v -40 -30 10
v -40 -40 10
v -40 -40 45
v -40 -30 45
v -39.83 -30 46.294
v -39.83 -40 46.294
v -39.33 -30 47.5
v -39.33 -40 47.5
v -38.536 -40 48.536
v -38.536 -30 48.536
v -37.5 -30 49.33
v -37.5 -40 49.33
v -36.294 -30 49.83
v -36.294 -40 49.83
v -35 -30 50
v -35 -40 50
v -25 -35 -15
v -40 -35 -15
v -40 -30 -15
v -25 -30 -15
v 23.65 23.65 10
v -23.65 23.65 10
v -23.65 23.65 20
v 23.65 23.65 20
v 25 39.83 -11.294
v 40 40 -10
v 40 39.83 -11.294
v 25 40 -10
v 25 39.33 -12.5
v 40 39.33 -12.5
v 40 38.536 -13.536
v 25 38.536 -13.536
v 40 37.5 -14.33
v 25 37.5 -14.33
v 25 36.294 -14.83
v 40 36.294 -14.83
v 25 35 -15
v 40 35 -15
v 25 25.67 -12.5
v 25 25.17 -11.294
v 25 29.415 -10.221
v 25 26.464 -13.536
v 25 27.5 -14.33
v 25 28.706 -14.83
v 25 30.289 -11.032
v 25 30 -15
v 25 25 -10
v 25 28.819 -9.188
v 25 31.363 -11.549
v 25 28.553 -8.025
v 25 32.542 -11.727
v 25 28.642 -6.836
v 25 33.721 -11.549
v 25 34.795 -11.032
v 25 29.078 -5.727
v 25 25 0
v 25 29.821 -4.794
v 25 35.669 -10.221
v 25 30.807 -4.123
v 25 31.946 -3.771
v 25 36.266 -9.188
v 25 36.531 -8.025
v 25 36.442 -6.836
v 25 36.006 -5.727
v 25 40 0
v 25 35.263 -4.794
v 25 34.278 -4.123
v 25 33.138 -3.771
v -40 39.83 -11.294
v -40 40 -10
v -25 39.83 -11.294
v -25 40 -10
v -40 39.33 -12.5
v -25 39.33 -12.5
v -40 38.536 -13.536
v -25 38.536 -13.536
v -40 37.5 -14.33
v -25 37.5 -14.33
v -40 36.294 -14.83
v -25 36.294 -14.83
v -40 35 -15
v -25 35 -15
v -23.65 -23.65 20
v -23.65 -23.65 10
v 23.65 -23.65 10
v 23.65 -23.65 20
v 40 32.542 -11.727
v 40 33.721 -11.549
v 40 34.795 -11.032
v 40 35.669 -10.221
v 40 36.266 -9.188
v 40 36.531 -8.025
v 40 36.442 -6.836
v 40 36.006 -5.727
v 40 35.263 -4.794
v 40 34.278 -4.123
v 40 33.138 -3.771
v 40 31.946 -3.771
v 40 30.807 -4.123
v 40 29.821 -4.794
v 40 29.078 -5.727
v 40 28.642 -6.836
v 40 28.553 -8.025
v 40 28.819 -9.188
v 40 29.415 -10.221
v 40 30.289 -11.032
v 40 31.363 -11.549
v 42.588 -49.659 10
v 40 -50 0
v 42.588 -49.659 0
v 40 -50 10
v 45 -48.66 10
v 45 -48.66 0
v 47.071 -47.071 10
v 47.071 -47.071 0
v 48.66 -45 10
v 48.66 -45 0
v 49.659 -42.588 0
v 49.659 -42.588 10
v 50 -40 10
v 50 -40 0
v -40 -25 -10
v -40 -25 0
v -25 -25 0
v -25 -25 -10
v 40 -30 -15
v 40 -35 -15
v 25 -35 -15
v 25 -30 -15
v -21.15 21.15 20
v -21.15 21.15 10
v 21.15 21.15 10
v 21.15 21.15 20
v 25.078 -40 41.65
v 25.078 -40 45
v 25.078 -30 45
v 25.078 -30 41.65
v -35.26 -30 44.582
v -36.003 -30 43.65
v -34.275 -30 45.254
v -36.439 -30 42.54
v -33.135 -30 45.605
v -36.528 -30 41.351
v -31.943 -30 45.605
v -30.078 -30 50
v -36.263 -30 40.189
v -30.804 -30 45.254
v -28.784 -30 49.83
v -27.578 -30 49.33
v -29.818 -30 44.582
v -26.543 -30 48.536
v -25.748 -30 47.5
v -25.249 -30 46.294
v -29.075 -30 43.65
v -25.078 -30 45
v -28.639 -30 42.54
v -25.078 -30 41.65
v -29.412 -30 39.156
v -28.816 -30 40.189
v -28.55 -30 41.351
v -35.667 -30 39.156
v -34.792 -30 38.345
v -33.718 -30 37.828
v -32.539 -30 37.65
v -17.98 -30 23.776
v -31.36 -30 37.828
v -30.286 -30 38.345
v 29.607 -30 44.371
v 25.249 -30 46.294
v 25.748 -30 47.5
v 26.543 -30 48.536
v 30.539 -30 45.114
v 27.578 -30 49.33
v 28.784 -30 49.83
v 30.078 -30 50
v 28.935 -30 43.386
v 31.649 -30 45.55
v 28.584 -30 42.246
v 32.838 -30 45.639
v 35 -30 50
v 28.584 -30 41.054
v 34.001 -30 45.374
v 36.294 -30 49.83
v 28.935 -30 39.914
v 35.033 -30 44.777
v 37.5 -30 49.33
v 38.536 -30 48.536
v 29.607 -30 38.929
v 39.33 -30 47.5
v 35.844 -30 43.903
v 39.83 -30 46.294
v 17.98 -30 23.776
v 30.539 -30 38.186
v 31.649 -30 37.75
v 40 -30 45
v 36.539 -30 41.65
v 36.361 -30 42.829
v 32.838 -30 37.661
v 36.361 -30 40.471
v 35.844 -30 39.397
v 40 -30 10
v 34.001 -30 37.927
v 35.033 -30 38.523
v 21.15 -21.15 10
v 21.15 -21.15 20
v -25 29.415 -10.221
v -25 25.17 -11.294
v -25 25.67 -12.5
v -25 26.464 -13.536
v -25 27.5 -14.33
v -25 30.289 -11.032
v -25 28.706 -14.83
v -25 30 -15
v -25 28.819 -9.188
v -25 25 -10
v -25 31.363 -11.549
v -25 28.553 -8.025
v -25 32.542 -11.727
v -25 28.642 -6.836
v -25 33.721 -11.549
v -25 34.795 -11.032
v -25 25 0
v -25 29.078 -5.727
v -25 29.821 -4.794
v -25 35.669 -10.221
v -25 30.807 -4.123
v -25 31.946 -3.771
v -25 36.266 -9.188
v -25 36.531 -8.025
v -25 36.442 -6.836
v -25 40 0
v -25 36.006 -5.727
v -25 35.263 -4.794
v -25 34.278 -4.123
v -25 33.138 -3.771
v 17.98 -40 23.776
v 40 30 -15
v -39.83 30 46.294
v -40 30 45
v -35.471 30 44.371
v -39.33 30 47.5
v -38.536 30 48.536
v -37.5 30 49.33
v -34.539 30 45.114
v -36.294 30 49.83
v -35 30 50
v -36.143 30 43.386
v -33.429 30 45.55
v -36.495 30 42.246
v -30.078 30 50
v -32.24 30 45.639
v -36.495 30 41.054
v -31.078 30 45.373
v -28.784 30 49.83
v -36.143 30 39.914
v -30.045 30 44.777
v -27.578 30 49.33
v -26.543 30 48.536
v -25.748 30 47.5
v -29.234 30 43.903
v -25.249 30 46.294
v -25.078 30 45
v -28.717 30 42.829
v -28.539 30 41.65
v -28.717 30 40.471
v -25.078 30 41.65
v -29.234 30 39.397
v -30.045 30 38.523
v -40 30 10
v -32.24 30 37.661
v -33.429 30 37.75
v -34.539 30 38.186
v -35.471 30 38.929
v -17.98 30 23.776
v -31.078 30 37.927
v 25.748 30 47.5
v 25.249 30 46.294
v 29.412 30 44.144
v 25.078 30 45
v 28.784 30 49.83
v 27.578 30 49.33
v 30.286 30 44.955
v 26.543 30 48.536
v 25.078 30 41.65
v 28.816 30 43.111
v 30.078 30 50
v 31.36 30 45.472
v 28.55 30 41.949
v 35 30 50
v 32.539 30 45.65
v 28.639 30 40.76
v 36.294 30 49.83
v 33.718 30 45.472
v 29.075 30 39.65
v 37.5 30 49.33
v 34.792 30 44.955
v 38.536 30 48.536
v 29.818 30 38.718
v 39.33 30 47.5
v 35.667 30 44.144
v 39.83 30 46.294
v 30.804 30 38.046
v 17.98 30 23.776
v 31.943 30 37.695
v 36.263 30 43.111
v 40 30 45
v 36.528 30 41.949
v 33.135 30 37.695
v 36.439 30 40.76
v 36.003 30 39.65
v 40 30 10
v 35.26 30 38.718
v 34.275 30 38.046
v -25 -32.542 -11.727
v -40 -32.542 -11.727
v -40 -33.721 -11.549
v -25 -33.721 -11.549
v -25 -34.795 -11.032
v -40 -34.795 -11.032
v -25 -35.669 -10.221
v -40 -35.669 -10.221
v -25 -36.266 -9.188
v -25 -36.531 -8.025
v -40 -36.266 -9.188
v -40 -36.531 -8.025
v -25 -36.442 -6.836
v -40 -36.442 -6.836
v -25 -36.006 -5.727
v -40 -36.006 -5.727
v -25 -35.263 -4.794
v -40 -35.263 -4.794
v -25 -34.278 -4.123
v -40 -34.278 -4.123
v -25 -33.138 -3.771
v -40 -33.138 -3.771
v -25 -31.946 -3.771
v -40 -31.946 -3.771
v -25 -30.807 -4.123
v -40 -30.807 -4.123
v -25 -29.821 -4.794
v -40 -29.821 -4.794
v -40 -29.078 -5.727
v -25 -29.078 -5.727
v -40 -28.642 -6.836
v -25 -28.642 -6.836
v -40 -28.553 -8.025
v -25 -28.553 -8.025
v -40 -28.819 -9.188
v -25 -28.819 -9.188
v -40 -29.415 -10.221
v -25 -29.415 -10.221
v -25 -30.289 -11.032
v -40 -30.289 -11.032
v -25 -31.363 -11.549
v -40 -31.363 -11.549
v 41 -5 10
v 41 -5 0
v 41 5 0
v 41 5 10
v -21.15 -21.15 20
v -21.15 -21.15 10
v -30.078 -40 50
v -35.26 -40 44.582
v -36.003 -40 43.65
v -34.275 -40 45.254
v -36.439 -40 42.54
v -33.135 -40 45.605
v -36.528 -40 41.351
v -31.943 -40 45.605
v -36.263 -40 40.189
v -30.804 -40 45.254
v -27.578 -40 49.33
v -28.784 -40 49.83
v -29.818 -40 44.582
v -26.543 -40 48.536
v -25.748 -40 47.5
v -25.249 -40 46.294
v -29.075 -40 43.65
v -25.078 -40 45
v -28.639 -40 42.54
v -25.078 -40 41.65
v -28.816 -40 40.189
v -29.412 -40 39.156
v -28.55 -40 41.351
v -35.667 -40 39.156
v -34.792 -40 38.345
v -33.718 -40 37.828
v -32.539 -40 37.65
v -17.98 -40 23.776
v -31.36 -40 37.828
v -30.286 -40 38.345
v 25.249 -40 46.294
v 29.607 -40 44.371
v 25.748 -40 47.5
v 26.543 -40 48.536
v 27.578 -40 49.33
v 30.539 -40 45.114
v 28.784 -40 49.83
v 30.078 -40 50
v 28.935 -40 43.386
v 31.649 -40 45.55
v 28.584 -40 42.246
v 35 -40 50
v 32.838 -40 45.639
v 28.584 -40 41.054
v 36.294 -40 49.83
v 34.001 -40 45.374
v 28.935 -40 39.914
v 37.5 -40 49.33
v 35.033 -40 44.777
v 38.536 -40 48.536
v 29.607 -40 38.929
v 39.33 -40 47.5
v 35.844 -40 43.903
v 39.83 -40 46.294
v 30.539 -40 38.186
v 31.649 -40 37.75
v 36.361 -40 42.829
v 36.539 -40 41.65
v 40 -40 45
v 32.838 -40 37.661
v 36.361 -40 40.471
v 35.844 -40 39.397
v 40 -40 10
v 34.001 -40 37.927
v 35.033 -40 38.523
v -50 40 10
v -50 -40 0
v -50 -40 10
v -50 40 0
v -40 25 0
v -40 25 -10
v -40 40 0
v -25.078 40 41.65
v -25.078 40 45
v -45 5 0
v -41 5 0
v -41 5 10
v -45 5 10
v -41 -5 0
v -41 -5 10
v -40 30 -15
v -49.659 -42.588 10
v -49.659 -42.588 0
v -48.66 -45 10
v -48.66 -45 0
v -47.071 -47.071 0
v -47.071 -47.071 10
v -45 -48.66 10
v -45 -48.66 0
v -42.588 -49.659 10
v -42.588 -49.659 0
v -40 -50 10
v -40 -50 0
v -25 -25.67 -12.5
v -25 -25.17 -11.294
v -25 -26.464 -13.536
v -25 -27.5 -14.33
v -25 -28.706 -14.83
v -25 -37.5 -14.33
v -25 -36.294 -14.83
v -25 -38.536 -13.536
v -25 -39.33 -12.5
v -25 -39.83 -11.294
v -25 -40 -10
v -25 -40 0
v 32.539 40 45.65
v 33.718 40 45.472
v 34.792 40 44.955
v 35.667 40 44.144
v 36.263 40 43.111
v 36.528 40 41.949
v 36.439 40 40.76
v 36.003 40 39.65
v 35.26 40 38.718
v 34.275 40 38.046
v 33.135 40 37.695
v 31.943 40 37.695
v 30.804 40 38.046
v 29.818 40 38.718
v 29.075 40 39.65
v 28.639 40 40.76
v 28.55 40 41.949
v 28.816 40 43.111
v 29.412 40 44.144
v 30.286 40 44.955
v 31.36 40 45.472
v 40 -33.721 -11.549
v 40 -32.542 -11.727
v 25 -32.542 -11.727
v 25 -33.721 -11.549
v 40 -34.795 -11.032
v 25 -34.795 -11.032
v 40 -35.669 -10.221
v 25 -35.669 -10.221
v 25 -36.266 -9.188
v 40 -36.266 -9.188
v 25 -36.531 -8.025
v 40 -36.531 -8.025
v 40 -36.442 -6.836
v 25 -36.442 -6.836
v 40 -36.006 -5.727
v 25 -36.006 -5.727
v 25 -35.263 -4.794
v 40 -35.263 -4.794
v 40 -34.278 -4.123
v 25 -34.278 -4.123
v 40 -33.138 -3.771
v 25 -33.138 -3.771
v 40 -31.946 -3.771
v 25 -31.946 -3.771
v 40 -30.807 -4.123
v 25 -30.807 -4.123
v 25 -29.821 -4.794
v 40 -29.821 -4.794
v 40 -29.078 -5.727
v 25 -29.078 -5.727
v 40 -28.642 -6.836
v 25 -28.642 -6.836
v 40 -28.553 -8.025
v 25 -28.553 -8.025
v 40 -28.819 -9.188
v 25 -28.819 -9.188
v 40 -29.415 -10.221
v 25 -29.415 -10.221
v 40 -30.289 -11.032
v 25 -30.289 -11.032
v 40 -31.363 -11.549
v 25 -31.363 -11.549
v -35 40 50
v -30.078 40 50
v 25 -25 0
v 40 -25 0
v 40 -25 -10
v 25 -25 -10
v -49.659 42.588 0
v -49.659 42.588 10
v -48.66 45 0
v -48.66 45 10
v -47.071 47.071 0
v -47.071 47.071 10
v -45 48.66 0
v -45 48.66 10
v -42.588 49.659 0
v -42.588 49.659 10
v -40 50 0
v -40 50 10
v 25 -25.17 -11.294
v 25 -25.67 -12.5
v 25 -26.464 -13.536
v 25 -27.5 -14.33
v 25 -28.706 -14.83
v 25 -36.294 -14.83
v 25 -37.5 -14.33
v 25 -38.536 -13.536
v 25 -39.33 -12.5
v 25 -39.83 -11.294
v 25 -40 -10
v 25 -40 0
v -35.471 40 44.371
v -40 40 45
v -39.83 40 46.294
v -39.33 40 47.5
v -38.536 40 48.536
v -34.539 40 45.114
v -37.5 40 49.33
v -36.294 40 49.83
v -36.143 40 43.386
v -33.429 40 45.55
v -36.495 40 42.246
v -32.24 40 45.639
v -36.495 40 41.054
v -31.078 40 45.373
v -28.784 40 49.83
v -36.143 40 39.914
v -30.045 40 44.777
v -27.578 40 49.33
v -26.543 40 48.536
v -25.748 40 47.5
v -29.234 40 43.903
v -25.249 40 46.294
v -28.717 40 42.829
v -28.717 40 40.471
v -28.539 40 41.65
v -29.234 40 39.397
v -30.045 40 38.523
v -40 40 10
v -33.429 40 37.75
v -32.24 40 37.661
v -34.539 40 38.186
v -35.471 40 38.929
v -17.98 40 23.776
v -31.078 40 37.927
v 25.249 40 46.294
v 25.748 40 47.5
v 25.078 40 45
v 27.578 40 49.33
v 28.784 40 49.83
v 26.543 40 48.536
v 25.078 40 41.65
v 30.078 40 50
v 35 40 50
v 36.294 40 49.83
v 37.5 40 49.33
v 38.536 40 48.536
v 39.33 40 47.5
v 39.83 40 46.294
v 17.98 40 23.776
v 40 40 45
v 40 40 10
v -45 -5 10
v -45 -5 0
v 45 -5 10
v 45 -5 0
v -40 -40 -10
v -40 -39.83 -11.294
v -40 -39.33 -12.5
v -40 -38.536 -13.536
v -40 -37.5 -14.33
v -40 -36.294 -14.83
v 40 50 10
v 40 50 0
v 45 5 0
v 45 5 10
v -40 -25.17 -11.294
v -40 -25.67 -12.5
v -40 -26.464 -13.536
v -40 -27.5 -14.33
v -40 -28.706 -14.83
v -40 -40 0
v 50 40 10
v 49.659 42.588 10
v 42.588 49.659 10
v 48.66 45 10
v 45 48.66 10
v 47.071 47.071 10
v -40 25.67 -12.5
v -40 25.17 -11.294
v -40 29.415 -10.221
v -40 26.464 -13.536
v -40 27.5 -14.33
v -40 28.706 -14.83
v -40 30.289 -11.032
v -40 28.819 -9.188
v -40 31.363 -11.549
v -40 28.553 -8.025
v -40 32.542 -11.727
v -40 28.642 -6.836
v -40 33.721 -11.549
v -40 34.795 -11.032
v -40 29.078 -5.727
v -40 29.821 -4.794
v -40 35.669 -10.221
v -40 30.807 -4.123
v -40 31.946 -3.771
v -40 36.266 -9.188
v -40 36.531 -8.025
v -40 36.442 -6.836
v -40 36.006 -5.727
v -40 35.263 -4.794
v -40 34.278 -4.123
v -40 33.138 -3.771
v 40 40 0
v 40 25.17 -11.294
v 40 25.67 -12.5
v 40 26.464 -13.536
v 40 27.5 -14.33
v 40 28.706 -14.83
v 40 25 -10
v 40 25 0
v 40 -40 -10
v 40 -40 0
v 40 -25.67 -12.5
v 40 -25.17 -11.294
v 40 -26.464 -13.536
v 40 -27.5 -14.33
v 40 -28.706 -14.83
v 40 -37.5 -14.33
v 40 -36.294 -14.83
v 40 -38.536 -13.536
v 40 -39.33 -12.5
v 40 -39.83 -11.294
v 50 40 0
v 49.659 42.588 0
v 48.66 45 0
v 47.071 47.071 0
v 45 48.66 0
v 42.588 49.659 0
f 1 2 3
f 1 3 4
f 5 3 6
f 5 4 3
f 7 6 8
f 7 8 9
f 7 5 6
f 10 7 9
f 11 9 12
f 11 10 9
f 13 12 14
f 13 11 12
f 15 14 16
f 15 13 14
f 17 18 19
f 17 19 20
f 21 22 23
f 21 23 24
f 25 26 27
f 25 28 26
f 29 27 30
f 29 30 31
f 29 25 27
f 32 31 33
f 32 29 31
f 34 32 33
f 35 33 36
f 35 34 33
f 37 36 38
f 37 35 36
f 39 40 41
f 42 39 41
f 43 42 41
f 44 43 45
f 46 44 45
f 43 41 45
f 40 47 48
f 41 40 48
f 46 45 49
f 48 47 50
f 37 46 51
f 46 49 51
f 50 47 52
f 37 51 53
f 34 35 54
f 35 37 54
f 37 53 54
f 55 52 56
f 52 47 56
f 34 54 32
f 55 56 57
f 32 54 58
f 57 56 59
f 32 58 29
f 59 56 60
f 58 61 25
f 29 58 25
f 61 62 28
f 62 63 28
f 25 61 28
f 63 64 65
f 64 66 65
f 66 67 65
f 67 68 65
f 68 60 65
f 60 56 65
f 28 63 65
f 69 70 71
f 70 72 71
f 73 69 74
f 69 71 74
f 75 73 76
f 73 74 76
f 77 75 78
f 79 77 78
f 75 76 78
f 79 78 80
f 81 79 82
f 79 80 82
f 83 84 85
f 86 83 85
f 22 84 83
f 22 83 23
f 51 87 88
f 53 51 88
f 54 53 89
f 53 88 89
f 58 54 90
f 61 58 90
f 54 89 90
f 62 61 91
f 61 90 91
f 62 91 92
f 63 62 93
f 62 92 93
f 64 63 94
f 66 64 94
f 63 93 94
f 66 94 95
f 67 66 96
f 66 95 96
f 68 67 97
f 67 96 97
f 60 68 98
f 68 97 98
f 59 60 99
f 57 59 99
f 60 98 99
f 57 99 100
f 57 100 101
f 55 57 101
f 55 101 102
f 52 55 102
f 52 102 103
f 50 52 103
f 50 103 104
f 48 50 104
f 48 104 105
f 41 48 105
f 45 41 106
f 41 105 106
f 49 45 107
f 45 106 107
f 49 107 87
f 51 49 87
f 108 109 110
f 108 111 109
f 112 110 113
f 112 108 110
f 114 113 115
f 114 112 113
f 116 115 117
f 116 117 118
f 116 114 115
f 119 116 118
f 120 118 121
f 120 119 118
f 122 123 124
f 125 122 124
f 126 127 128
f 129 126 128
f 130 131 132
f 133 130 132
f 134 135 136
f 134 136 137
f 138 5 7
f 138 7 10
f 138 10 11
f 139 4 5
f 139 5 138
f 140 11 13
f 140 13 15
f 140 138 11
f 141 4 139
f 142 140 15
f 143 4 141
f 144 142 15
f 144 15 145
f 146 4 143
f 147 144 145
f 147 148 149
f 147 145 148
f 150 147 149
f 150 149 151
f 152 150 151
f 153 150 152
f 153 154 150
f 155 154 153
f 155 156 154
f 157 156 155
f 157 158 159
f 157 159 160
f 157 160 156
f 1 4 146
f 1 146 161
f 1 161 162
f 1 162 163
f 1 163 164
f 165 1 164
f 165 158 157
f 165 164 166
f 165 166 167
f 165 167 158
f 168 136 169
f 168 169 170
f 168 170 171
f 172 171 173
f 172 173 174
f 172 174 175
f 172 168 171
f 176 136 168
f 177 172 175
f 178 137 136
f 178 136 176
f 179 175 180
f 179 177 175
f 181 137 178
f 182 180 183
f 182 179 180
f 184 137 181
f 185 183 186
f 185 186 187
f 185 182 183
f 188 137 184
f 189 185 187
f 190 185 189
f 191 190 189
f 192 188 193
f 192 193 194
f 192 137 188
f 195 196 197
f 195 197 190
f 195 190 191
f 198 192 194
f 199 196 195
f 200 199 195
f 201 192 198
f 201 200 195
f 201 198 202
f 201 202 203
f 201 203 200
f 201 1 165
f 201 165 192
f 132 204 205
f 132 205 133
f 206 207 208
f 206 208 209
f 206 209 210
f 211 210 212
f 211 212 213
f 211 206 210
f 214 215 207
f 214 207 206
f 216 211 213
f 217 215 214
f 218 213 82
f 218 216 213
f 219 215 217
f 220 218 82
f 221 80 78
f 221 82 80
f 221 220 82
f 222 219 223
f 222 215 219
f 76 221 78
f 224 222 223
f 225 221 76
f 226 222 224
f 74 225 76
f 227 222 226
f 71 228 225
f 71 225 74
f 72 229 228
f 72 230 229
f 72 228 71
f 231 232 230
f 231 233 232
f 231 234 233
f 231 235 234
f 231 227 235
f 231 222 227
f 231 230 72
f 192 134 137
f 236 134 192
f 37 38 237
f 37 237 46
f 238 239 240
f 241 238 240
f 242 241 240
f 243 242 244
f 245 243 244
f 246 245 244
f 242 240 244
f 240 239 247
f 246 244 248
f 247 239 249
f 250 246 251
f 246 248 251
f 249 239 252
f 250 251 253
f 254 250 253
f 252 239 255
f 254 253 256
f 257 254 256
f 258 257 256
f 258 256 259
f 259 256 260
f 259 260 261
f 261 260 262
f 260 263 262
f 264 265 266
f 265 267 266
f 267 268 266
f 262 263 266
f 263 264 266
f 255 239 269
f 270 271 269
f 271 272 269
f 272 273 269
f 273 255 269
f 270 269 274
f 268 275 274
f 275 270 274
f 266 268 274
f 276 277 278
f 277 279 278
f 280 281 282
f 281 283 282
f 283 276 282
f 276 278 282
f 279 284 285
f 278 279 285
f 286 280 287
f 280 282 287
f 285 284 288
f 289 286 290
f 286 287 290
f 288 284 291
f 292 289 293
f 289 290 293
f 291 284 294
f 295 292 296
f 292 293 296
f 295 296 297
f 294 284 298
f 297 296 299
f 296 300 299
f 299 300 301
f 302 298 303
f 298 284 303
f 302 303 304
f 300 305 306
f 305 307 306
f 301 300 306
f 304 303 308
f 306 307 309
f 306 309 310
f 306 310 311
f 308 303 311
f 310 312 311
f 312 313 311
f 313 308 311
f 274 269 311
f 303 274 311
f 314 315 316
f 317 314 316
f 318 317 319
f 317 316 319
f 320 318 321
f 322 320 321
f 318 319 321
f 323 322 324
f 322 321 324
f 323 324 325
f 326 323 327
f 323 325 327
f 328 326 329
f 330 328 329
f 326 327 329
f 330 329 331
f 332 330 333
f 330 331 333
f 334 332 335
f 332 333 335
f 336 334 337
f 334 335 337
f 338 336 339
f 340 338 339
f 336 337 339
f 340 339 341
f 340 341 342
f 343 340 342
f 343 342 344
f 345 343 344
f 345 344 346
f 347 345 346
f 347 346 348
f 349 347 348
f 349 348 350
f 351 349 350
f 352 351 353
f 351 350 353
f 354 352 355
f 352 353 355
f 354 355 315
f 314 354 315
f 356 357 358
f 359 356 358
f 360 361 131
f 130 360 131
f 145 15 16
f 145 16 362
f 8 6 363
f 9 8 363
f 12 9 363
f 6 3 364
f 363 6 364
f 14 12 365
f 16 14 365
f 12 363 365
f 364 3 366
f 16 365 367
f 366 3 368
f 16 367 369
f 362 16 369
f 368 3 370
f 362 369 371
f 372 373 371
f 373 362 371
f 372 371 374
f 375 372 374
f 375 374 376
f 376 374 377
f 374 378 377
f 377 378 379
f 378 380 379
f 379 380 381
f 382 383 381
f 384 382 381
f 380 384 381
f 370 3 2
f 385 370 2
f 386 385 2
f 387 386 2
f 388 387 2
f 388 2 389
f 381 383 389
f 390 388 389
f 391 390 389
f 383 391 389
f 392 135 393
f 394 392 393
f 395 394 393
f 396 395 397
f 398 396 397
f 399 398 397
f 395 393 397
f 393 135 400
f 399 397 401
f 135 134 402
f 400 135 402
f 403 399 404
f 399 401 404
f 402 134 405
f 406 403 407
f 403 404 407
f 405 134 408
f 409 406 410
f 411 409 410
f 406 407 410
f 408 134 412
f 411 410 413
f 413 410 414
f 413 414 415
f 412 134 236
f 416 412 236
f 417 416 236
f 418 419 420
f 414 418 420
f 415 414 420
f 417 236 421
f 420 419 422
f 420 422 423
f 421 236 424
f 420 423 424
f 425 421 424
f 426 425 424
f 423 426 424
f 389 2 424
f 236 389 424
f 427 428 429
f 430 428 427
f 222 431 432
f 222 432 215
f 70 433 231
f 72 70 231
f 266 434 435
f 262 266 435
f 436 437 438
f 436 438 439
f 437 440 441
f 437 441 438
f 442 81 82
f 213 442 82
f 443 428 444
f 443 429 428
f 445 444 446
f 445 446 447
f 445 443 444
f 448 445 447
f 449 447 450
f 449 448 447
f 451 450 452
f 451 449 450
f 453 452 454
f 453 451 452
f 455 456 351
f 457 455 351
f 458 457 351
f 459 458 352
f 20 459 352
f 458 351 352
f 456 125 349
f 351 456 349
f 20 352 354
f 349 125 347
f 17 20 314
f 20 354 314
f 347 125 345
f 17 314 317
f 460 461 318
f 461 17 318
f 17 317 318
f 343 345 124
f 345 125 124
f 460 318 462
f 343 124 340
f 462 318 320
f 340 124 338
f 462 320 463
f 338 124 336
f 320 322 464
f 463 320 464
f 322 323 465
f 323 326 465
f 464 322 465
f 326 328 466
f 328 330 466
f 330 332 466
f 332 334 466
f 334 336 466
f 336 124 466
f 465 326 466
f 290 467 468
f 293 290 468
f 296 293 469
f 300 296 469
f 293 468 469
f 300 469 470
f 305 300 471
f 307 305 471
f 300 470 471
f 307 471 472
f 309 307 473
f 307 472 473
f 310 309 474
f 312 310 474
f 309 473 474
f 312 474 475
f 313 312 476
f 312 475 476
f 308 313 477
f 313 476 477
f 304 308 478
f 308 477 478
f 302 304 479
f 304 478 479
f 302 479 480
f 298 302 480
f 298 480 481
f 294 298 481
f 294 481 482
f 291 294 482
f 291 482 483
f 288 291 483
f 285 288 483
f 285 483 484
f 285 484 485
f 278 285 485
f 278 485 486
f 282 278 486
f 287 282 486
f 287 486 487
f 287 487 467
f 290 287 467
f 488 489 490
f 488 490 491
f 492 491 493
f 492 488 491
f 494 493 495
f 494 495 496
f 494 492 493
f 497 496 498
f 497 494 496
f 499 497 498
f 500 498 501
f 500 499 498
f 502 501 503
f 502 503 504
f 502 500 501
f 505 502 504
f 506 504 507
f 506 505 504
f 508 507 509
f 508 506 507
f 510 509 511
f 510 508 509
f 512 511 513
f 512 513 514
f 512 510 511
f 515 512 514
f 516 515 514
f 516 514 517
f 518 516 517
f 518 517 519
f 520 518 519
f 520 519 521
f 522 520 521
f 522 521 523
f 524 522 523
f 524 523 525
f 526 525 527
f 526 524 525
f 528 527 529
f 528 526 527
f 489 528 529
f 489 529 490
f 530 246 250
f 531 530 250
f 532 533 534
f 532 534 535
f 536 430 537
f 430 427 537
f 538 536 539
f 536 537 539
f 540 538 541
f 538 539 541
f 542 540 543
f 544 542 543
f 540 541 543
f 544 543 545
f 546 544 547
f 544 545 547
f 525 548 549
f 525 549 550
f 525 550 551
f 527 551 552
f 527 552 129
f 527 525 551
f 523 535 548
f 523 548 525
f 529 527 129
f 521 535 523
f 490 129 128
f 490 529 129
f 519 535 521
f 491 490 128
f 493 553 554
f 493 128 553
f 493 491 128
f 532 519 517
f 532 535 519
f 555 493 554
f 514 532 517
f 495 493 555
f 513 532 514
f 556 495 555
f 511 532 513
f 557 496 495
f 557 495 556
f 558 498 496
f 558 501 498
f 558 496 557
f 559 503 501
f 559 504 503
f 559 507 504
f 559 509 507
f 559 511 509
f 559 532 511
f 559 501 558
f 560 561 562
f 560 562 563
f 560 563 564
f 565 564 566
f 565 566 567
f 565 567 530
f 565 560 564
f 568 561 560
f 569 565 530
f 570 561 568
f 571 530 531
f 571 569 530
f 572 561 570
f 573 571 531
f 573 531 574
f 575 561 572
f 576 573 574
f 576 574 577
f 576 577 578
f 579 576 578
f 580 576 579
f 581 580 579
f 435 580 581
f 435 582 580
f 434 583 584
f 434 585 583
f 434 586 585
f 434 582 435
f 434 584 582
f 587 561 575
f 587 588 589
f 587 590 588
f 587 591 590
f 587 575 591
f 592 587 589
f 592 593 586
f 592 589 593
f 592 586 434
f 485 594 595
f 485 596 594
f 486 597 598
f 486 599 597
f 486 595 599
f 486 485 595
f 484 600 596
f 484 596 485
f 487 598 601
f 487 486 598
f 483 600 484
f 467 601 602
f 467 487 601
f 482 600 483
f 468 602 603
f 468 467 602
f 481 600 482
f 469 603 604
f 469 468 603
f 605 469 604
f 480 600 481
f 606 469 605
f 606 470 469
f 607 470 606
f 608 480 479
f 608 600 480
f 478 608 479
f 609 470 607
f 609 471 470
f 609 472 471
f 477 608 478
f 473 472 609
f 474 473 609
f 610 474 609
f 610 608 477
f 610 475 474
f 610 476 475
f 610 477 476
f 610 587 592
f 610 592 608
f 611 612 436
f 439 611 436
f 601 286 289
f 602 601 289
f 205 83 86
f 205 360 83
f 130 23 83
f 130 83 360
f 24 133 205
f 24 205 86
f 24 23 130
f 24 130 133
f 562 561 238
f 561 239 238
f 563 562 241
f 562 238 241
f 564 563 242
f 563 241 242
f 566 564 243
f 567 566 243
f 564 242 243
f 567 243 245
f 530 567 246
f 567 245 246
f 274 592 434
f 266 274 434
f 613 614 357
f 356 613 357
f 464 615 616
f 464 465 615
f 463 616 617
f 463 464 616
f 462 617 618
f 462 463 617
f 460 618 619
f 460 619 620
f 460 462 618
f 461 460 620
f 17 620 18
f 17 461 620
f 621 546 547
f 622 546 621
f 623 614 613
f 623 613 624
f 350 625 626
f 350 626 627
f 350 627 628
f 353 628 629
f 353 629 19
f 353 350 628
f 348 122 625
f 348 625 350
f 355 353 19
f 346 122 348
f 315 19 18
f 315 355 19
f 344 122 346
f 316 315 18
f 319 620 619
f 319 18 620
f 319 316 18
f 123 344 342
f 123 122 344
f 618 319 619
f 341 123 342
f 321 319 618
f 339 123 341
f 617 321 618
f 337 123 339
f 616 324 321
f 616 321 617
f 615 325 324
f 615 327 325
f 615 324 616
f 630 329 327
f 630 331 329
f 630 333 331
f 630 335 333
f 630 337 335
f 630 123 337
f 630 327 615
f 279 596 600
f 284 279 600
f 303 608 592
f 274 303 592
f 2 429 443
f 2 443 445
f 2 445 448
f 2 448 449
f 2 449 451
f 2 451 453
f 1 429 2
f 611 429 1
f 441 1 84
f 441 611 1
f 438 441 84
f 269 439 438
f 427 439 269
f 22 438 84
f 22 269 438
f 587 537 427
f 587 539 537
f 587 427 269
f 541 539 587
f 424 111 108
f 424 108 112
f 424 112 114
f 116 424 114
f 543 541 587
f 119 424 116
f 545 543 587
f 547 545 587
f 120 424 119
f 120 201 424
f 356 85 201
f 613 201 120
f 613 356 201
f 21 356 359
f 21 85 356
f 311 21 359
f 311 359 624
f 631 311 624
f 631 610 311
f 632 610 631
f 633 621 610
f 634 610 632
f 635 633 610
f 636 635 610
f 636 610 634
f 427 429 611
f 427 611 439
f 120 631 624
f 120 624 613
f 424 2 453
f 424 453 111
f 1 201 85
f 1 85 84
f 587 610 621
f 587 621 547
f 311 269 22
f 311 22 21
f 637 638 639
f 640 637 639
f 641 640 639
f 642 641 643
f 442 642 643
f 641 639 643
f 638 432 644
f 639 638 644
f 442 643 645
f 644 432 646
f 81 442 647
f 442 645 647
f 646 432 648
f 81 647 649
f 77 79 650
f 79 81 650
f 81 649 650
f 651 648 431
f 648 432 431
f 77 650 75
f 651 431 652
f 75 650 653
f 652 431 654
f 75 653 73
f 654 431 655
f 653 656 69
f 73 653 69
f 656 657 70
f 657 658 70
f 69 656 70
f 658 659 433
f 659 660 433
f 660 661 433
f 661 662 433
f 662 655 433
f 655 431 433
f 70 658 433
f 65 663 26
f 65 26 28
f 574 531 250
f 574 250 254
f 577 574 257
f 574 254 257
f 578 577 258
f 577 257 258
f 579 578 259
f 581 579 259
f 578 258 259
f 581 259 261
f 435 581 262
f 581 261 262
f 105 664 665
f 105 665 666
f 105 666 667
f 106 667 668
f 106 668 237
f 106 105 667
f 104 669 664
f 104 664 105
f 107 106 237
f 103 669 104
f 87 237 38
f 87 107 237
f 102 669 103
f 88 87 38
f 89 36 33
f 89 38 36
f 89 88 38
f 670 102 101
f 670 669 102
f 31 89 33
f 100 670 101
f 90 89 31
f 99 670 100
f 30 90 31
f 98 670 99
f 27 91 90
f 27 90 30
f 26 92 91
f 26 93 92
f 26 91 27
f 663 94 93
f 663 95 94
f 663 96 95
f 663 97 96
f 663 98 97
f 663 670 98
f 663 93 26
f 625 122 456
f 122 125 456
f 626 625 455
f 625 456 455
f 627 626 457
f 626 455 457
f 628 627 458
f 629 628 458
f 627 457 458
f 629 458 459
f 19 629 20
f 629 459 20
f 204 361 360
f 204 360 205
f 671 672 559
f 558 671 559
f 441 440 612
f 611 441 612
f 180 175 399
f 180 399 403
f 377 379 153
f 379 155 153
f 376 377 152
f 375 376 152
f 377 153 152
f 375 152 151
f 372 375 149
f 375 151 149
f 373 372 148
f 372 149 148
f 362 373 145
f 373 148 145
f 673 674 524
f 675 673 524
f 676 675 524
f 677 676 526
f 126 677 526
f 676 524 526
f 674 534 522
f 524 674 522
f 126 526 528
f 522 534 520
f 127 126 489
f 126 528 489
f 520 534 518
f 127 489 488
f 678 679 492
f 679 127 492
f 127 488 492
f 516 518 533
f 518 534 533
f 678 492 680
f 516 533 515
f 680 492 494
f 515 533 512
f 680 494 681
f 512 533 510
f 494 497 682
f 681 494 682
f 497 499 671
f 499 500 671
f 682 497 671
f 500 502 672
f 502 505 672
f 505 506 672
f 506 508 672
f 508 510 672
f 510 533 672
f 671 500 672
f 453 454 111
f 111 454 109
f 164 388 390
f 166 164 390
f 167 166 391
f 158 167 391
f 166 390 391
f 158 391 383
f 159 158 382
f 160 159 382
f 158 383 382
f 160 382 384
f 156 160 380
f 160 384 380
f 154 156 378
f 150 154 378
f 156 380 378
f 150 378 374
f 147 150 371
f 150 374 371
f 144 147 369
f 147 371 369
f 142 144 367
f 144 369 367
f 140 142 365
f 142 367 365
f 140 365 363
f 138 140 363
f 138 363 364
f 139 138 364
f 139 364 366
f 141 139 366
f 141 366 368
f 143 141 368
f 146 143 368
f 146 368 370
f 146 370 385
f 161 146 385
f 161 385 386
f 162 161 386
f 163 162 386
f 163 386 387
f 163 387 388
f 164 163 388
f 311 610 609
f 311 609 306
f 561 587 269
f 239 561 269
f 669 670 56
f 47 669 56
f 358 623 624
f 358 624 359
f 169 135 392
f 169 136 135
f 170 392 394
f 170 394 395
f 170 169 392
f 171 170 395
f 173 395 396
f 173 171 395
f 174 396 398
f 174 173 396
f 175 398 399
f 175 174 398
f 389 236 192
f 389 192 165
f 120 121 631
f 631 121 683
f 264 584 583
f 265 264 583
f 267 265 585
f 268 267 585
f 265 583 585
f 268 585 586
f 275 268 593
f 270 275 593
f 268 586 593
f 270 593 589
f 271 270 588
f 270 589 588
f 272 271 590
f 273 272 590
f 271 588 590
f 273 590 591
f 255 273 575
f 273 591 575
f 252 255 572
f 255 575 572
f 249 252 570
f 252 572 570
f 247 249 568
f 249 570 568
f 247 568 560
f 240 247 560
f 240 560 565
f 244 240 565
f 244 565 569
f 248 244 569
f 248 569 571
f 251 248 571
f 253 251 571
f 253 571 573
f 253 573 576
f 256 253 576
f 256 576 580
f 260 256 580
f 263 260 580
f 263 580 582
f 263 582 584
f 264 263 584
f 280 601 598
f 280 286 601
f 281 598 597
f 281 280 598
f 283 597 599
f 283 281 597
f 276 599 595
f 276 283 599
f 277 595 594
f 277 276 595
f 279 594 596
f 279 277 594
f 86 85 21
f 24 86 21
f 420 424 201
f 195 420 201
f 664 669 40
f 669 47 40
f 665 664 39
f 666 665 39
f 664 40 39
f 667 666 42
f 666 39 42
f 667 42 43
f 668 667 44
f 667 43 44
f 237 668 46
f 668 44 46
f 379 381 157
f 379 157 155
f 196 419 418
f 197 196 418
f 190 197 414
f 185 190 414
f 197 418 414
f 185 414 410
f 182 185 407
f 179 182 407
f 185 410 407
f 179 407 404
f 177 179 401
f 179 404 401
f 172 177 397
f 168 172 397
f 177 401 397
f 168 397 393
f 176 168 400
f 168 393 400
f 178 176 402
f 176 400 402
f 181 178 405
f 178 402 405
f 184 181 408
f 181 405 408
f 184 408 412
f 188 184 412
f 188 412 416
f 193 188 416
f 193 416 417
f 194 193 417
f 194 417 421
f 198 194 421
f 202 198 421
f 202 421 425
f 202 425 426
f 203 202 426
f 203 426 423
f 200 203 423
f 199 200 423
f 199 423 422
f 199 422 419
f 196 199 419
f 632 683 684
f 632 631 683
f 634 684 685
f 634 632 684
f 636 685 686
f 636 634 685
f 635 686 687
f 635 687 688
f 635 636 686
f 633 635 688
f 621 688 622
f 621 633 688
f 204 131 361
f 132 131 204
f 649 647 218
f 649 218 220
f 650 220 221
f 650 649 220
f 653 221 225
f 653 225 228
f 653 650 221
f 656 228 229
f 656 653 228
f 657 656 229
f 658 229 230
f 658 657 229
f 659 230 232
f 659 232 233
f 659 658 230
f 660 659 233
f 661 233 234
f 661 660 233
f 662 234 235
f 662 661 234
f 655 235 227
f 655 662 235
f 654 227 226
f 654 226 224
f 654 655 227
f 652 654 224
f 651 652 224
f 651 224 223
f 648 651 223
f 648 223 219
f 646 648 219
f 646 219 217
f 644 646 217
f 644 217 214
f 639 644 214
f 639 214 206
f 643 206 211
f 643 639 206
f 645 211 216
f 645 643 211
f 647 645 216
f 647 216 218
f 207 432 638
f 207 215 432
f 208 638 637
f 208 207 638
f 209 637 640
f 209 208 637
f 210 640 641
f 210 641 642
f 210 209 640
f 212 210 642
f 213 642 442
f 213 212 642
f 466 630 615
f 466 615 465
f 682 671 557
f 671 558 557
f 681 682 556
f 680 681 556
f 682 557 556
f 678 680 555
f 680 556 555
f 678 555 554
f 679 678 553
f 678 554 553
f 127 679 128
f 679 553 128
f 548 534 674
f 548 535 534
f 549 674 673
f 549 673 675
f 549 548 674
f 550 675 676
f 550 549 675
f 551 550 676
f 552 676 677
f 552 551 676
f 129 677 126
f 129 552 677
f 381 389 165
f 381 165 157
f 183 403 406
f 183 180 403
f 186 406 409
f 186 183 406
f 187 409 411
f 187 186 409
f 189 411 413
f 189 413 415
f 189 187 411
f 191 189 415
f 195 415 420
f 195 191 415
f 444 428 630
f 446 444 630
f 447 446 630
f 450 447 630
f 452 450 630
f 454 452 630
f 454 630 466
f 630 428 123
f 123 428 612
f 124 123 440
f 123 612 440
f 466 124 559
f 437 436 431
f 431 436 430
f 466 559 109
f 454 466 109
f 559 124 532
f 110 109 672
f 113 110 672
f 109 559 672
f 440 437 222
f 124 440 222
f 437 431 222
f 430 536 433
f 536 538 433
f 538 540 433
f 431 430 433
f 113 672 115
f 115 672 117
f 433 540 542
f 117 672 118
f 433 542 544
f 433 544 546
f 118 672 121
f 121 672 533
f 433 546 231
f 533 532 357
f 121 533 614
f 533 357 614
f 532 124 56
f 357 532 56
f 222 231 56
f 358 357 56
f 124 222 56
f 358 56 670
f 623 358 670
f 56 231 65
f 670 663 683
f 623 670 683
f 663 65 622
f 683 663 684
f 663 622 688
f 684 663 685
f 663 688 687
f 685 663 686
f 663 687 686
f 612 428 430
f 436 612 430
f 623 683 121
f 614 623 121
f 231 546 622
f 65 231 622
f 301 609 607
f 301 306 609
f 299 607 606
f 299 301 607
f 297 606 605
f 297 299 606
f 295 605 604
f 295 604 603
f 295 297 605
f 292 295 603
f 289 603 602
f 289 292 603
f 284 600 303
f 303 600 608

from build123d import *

# Parameters (mm, degrees)
SCHIZZO1_W                   = 100
SCHIZZO1_H                   = 100
ESTRUSIONE_ESTRUSIONE1_DEPTH = 10
RACCORDO1_R                  = 10
SCHIZZO6_W                   = 15
SCHIZZO6_H                   = 15
ESTRUSIONE_ESTRUSIONE2_DEPTH = 15
RACCORDO2_R                  = 5
SCHIZZO7_R                   = 4
TAGLIO_ESTRUSIONE1_DEPTH     = 15
RACCORDO3_R                  = 5
SPECCHIA6_COPY_1_SKETCH_W    = 15
SPECCHIA6_COPY_1_SKETCH_H    = 15
SPECCHIA6_COPY_1_DEPTH       = 15
SPECCHIA6_COPY_2_SKETCH_R    = 4
SPECCHIA6_COPY_2_DEPTH       = 15
SPECCHIA6_COPY_3_SKETCH_W    = 15
SPECCHIA6_COPY_3_SKETCH_H    = 15
SPECCHIA6_COPY_3_DEPTH       = 15
SPECCHIA6_COPY_4_SKETCH_R    = 4
SPECCHIA6_COPY_4_DEPTH       = 15
RACCORDO3_OF_SPECCHIA6_R     = 5
RACCORDO4_R                  = 5
SCHIZZO8_W                   = 47.3
SCHIZZO8_H                   = 47.3
SCHIZZO8_W_2                 = 42.3
SCHIZZO8_H_2                 = 42.3
ESTRUSIONE_ESTRUSIONE4_DEPTH = 10
SCHIZZO10_W                  = 80
SCHIZZO10_H                  = 10
ESTRUSIONE_ESTRUSIONE6_DEPTH = 40
SCHIZZO11_R                  = 4
TAGLIO_ESTRUSIONE4_DEPTH     = 30
SCHIZZO11_4_R                = 4
TAGLIO_ESTRUSIONE5_DEPTH     = 30
RACCORDO5_R                  = 5
RACCORDO6_R                  = 5
TAGLIO_ESTRUSIONE6_DEPTH     = 30
RACCORDO7_R                  = 5
RACCORDO8_R                  = 5
RACCORDO9_R                  = 5
SCHIZZO15_R                  = 4
TAGLIO_ESTRUSIONE7_DEPTH     = 30
SCHIZZO15_3_R                = 4
TAGLIO_ESTRUSIONE8_DEPTH     = 30
SCHIZZO16_W                  = 4
SCHIZZO16_H                  = 10
TAGLIO_ESTRUSIONE11_DEPTH    = 10


with BuildPart() as part:
    # Schizzo1 → Estrusione-Estrusione1 (new body)
    with BuildSketch(Plane.XY):
        Rectangle(SCHIZZO1_W, SCHIZZO1_H)
    extrude(amount=ESTRUSIONE_ESTRUSIONE1_DEPTH)

    # Raccordo1
    raccordo1_edges = [part.edges().sort_by_distance(p)[0] for p in [
        (50, -50, 5),
        (-50, -50, 5),
        (50, 50, 5),
        (-50, 50, 5),
    ]]
    fillet(raccordo1_edges, radius=RACCORDO1_R)

    # Schizzo6 → Estrusione-Estrusione2 (add)
    with BuildSketch(Plane(origin=(0, 0, 0), x_dir=(-1, 0, 0), z_dir=(0, 0, -1))):
        with Locations((-32.5, 32.5)):
            Rectangle(SCHIZZO6_W, SCHIZZO6_H)
    estrusione_estrusione2 = extrude(amount=ESTRUSIONE_ESTRUSIONE2_DEPTH)

    # Raccordo2
    raccordo2_edges = [part.edges().sort_by_distance(p)[0] for p in [
        (32.5, 25, -15),
        (32.5, 40, -15),
    ]]
    fillet(raccordo2_edges, radius=RACCORDO2_R)

    # Schizzo7 → Taglio-Estrusione1 (cut)
    with BuildSketch(Plane(origin=(40, 0, 0), x_dir=(0, 0, -1), z_dir=(1, 0, 0))):
        with Locations((7.72654806, 32.54210957)):
            Circle(SCHIZZO7_R)
    taglio_estrusione1 = extrude(amount=-TAGLIO_ESTRUSIONE1_DEPTH, mode=Mode.SUBTRACT)

    # Specchia3: Estrusione-Estrusione2, Taglio-Estrusione1 across plane
    add(estrusione_estrusione2.mirror(Plane(origin=(0, 0, 0), x_dir=(0, 0, 1), z_dir=(1, 0, 0))))
    add(taglio_estrusione1.mirror(Plane(origin=(0, 0, 0), x_dir=(0, 0, 1), z_dir=(1, 0, 0))), mode=Mode.SUBTRACT)

    # Raccordo3
    raccordo3_edges = [part.edges().sort_by_distance(p)[0] for p in [
        (-32.5, 25, -15),
        (-32.5, 40, -15),
    ]]
    fillet(raccordo3_edges, radius=RACCORDO3_R)

    # Specchia6 copy 1 sketch → Specchia6 copy 1 (add)
    with BuildSketch(Plane(origin=(0, 0, 0), x_dir=(1, 0, 0), z_dir=(0, 0, -1))):
        with Locations((-32.5, 32.5)):
            Rectangle(SPECCHIA6_COPY_1_SKETCH_W, SPECCHIA6_COPY_1_SKETCH_H)
    extrude(amount=SPECCHIA6_COPY_1_DEPTH)

    # Specchia6 copy 2 sketch → Specchia6 copy 2 (cut)
    with BuildSketch(Plane(origin=(-40, 0, 0), x_dir=(0, 0, -1), z_dir=(-1, 0, 0))):
        with Locations((7.72654806, 32.54210957)):
            Circle(SPECCHIA6_COPY_2_SKETCH_R)
    extrude(amount=-SPECCHIA6_COPY_2_DEPTH, mode=Mode.SUBTRACT)

    # Specchia6 copy 3 sketch → Specchia6 copy 3 (add)
    with BuildSketch(Plane(origin=(0, 0, 0), x_dir=(-1, 0, 0), z_dir=(0, 0, -1))):
        with Locations((-32.5, -32.5)):
            Rectangle(SPECCHIA6_COPY_3_SKETCH_W, SPECCHIA6_COPY_3_SKETCH_H)
    extrude(amount=SPECCHIA6_COPY_3_DEPTH)

    # Specchia6 copy 4 sketch → Specchia6 copy 4 (cut)
    with BuildSketch(Plane(origin=(40, 0, 0), x_dir=(0, 0, -1), z_dir=(1, 0, 0))):
        with Locations((7.72654806, -32.54210957)):
            Circle(SPECCHIA6_COPY_4_SKETCH_R)
    extrude(amount=-SPECCHIA6_COPY_4_DEPTH, mode=Mode.SUBTRACT)

    # Raccordo3 of Specchia6
    raccordo3_of_specchia6_edges = [part.edges().sort_by_distance(p)[0] for p in [
        (-32.5, -25, -15),
        (-32.5, -40, -15),
    ]]
    fillet(raccordo3_of_specchia6_edges, radius=RACCORDO3_OF_SPECCHIA6_R)

    # Raccordo4
    raccordo4_edges = [part.edges().sort_by_distance(p)[0] for p in [
        (32.5, -40, -15),
        (32.5, -25, -15),
    ]]
    fillet(raccordo4_edges, radius=RACCORDO4_R)

    # Schizzo8 → Estrusione-Estrusione4 (add)
    with BuildSketch(Plane.XY.offset(10)):
        Rectangle(SCHIZZO8_W, SCHIZZO8_H)
        Rectangle(SCHIZZO8_W_2, SCHIZZO8_H_2, mode=Mode.SUBTRACT)
    extrude(amount=ESTRUSIONE_ESTRUSIONE4_DEPTH)

    # Schizzo10 → Estrusione-Estrusione6 (add)
    with BuildSketch(Plane.XY.offset(10)):
        with Locations((0, -35)):
            Rectangle(SCHIZZO10_W, SCHIZZO10_H)
    estrusione_estrusione6 = extrude(amount=ESTRUSIONE_ESTRUSIONE6_DEPTH)

    # Schizzo11 → Taglio-Estrusione4 (cut)
    with BuildSketch(Plane.XZ.offset(40)):
        with Locations((32.539177419, 41.650021723)):
            Circle(SCHIZZO11_R)
    extrude(amount=-TAGLIO_ESTRUSIONE4_DEPTH, mode=Mode.SUBTRACT)

    # Schizzo11<4> → Taglio-Estrusione5 (cut)
    with BuildSketch(Plane.XZ.offset(40)):
        with Locations((-32.539177419, 41.650021723)):
            Circle(SCHIZZO11_4_R)
        with Locations((32.539177419, 41.650021723)):
            Circle(SCHIZZO11_4_R)
    extrude(amount=-TAGLIO_ESTRUSIONE5_DEPTH, mode=Mode.SUBTRACT)

    # Raccordo5
    raccordo5_edges = [part.edges().sort_by_distance(p)[0] for p in [
        (-40, -35, 50),
    ]]
    fillet(raccordo5_edges, radius=RACCORDO5_R)

    # Raccordo6
    raccordo6_edges = [part.edges().sort_by_distance(p)[0] for p in [
        (40, -35, 50),
    ]]
    fillet(raccordo6_edges, radius=RACCORDO6_R)

    # Schizzo14 → Taglio-Estrusione6 (cut)
    with BuildSketch(Plane.XZ.offset(40)):
        Polygon((-25.078354838, 41.650021723), (-25.078354838, 50), (25.078354838, 50), (25.078354838, 41.650021723), (17.979592653, 23.776203366), (-17.979592653, 23.776203366), align=None)
    taglio_estrusione6 = extrude(amount=-TAGLIO_ESTRUSIONE6_DEPTH, mode=Mode.SUBTRACT)

    # Raccordo7
    raccordo7_edges = [part.edges().sort_by_distance(p)[0] for p in [
        (-25.078354838, -35, 50),
    ]]
    fillet(raccordo7_edges, radius=RACCORDO7_R)

    # Raccordo8
    raccordo8_edges = [part.edges().sort_by_distance(p)[0] for p in [
        (25.078354838, -35, 50),
    ]]
    fillet(raccordo8_edges, radius=RACCORDO8_R)

    # Specchia13: Estrusione-Estrusione6 across plane
    add(estrusione_estrusione6.mirror(Plane.ZX))

    # Specchia14: Estrusione-Estrusione6, Taglio-Estrusione6 across plane
    add(estrusione_estrusione6.mirror(Plane.ZX))
    add(taglio_estrusione6.mirror(Plane.ZX), mode=Mode.SUBTRACT)

    # Raccordo9
    raccordo9_edges = [part.edges().sort_by_distance(p)[0] for p in [
        (-40, 35, 50),
        (-25.078354838, 35, 50),
        (40, 35, 50),
        (25.078354838, 35, 50),
    ]]
    fillet(raccordo9_edges, radius=RACCORDO9_R)

    # Schizzo15 → Taglio-Estrusione7 (cut)
    with BuildSketch(Plane(origin=(0, 40, 0), x_dir=(1, 0, 0), z_dir=(0, 1, 0))):
        with Locations((32.539177419, -41.65)):
            Circle(SCHIZZO15_R)
    extrude(amount=-TAGLIO_ESTRUSIONE7_DEPTH, mode=Mode.SUBTRACT)

    # Schizzo15<3> → Taglio-Estrusione8 (cut)
    with BuildSketch(Plane(origin=(0, 40, 0), x_dir=(1, 0, 0), z_dir=(0, 1, 0))):
        with Locations((32.539177419, -41.65)):
            Circle(SCHIZZO15_3_R)
        with Locations((-32.539177419, -41.65)):
            Circle(SCHIZZO15_3_R)
    extrude(amount=-TAGLIO_ESTRUSIONE8_DEPTH, mode=Mode.SUBTRACT)

    # Schizzo16 → Taglio-Estrusione11 (cut)
    with BuildSketch(Plane(origin=(0, 0, 0), x_dir=(-1, 0, 0), z_dir=(0, 0, -1))):
        with Locations((-43, 0)):
            Rectangle(SCHIZZO16_W, SCHIZZO16_H)
        with Locations((43, 0)):
            Rectangle(SCHIZZO16_W, SCHIZZO16_H)
    extrude(amount=-TAGLIO_ESTRUSIONE11_DEPTH, mode=Mode.SUBTRACT)


solid = part.part
